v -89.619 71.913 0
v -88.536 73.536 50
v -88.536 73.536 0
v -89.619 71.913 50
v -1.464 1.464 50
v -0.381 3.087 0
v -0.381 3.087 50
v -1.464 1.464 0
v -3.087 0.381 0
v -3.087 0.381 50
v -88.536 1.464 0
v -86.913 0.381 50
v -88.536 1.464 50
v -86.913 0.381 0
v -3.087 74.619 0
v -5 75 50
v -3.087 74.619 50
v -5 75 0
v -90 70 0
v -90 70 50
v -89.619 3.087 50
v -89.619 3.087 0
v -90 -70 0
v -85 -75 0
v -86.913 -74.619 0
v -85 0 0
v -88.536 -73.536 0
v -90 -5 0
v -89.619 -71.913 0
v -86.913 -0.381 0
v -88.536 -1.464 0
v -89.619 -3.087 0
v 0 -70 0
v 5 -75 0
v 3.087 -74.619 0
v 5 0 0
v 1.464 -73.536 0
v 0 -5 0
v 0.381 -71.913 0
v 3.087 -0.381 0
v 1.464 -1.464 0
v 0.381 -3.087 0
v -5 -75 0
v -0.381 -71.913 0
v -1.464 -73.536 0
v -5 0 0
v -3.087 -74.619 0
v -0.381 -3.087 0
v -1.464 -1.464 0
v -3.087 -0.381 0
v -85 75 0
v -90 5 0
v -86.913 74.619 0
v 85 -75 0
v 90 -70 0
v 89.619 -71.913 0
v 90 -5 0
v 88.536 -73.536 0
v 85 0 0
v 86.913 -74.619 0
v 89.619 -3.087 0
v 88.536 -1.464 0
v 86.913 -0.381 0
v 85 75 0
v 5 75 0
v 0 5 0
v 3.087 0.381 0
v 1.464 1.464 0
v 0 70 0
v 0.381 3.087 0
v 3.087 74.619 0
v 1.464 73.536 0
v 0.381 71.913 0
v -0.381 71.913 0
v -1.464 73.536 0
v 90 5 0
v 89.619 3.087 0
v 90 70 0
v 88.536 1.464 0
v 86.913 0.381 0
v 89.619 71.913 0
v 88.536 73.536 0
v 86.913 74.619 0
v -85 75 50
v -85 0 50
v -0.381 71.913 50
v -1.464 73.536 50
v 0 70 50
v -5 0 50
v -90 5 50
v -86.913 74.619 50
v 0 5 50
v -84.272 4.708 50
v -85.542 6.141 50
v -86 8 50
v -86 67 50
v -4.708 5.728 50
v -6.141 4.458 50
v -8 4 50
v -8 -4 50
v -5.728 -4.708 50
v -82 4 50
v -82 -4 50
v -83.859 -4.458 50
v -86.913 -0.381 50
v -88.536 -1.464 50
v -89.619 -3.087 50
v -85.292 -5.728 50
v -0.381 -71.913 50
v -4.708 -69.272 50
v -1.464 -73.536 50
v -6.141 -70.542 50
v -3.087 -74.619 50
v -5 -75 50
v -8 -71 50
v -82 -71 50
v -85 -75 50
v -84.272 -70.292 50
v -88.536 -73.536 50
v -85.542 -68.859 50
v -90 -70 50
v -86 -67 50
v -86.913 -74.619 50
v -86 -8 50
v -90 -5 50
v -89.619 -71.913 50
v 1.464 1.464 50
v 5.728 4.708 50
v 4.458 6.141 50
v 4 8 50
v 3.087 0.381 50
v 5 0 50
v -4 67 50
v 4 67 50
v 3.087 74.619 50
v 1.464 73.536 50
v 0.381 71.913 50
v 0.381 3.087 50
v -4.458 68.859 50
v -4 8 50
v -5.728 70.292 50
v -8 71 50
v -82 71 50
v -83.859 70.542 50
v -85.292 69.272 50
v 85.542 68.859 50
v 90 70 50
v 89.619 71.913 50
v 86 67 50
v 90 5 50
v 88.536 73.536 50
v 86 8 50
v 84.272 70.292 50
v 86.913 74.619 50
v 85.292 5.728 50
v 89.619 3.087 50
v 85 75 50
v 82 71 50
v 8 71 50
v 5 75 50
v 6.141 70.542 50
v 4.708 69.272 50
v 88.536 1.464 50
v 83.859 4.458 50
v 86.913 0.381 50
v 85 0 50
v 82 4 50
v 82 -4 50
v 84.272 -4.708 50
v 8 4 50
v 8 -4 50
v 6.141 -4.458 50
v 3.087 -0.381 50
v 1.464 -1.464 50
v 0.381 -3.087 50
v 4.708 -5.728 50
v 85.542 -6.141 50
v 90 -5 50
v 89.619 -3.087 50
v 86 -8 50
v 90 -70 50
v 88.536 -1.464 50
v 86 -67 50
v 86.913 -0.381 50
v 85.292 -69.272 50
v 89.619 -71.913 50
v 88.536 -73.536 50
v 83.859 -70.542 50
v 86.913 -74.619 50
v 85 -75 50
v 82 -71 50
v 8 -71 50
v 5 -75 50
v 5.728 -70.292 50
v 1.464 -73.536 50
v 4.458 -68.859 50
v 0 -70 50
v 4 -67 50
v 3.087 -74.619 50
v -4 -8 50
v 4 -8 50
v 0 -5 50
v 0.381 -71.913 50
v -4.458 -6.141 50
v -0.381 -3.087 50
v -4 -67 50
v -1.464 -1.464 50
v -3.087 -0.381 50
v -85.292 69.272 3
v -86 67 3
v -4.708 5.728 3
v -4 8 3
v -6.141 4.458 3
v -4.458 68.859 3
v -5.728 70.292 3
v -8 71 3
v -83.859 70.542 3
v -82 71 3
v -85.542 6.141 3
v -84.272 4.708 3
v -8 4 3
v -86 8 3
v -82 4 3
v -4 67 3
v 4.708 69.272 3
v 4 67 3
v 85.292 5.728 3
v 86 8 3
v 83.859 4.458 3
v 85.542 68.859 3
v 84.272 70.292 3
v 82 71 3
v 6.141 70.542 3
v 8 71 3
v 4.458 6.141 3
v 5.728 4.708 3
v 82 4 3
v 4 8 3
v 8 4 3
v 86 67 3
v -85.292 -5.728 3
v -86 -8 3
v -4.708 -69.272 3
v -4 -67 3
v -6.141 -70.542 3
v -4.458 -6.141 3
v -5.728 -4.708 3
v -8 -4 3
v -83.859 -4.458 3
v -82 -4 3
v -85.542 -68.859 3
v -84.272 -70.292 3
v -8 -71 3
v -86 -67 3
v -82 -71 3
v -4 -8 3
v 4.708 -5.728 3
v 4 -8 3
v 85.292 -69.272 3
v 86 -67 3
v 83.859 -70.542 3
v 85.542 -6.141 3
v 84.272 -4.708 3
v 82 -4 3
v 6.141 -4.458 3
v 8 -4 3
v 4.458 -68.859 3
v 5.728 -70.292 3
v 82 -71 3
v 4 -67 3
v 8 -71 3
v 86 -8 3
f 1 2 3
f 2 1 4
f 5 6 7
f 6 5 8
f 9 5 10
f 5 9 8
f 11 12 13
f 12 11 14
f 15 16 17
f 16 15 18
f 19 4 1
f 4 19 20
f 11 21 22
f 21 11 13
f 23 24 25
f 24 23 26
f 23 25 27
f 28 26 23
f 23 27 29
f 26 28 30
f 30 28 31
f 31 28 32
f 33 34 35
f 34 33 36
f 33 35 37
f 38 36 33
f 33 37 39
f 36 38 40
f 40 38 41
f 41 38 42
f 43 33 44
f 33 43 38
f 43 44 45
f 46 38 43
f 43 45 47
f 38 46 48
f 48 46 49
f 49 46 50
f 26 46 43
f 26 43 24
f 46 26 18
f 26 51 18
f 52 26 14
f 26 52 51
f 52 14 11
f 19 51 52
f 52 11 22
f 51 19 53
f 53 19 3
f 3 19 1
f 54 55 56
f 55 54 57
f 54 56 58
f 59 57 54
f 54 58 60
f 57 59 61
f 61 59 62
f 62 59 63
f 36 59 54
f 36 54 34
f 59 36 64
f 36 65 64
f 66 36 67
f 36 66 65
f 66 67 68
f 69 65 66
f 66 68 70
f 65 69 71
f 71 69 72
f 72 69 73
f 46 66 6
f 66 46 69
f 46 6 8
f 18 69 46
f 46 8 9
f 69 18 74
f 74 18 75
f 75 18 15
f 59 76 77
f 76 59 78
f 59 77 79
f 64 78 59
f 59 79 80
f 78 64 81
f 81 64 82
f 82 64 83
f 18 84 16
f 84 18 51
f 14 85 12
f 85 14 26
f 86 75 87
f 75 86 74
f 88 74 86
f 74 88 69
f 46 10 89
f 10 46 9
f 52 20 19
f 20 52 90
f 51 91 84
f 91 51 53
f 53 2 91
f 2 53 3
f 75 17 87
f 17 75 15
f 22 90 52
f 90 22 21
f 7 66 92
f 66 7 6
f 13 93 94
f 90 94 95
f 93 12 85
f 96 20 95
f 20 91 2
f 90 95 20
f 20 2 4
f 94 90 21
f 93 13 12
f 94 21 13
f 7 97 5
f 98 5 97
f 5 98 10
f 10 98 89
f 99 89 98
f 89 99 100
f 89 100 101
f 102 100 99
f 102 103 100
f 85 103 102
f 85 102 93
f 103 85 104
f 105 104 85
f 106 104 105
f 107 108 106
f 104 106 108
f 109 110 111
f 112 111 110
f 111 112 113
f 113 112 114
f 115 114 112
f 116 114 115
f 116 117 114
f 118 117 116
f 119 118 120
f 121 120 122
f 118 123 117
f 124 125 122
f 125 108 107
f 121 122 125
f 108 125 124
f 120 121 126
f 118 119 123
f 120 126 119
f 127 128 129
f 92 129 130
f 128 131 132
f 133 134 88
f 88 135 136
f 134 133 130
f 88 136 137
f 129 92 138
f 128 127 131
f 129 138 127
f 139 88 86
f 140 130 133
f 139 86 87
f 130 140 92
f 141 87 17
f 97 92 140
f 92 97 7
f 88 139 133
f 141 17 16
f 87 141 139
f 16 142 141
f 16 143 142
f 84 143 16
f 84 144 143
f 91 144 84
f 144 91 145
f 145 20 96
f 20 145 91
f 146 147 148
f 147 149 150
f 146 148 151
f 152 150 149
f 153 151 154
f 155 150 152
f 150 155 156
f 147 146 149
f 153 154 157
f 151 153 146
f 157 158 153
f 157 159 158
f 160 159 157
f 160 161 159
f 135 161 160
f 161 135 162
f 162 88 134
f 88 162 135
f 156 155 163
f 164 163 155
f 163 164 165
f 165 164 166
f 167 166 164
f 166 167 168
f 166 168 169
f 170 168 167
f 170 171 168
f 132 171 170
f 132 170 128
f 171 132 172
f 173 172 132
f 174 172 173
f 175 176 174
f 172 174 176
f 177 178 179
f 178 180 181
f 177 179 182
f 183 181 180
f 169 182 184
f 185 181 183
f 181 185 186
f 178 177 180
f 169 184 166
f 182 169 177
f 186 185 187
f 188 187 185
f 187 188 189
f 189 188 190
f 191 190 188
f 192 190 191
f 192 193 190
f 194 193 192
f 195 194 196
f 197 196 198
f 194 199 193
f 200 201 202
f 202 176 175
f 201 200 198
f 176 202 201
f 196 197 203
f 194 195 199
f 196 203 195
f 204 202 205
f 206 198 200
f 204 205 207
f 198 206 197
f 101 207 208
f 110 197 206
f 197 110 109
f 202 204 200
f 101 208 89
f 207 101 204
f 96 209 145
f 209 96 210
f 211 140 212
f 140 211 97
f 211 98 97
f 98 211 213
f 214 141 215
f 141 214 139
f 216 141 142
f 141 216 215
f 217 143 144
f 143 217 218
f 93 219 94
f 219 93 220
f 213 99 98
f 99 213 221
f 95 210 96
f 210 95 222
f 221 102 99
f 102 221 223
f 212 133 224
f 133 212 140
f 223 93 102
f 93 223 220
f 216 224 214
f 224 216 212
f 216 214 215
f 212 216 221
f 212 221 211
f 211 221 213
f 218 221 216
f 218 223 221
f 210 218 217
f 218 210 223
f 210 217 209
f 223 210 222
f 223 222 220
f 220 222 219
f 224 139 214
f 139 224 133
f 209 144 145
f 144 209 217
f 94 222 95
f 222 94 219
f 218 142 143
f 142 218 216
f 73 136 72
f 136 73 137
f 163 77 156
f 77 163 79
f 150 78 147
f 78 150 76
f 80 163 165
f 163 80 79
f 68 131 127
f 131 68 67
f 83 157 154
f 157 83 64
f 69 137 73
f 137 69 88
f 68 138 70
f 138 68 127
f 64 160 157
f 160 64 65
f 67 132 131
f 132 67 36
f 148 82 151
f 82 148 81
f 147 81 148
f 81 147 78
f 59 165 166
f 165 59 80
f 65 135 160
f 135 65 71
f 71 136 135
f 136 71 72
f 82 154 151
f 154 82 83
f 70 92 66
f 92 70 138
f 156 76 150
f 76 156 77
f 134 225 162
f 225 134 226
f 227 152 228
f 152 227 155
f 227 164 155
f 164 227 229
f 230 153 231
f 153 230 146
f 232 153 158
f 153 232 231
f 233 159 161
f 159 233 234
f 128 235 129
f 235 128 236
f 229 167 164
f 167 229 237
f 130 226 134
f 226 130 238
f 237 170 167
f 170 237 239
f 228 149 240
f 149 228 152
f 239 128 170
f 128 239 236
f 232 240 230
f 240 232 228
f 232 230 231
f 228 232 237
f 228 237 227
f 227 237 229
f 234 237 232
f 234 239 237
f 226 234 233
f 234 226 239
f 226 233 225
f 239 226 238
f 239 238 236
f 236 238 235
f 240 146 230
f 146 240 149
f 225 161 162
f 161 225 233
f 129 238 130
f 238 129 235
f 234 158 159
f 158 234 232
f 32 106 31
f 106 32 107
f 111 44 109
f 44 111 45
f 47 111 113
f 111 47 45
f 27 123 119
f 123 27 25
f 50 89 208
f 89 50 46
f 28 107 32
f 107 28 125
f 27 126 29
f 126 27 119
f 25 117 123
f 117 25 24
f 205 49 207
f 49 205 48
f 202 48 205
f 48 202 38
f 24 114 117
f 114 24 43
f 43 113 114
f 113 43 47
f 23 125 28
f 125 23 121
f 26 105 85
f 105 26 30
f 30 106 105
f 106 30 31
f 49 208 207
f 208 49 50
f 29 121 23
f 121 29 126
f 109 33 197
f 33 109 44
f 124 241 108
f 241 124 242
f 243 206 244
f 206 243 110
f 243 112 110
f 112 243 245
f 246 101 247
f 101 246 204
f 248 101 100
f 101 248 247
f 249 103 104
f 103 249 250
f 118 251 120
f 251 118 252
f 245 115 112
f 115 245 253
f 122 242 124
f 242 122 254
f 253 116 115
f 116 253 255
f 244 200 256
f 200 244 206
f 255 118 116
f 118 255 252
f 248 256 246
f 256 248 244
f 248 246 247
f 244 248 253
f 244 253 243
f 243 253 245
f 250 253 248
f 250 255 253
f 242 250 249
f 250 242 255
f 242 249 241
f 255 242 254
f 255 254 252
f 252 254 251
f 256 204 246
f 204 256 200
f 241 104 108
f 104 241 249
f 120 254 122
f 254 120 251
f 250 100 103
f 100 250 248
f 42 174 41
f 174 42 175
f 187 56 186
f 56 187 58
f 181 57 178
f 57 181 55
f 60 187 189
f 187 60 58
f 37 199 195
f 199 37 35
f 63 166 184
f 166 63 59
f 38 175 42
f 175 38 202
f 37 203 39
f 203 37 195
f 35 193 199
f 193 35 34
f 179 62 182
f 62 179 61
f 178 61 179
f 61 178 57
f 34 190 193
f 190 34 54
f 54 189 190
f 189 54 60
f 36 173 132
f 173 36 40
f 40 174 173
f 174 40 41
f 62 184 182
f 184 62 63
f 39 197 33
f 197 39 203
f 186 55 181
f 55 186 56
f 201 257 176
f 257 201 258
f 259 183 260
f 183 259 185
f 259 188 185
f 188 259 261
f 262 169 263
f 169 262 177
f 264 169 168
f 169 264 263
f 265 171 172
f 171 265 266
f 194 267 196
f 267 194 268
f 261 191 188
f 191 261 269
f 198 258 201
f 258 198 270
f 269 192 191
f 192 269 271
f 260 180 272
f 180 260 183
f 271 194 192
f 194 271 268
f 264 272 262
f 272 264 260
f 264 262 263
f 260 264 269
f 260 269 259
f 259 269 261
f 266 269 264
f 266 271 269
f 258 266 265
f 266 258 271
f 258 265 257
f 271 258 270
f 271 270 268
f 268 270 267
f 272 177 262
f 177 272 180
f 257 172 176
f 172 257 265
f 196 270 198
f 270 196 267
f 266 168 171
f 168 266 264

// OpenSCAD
// Dell PowerEdge R740 Floor Standoffs
//
// Print 4 in PETG or ABS.  Keeps a 2U server off the floor
// for dust clearance and bottom intake airflow.
//
// Adjust dimensions at the top, then render (F6) and export STL.
// The `layout()` module arranges all 4 pieces for a single print.

// ── User parameters ───────────────────────────────────────
STANDOFF_H  = 50;   // total height (mm) — clearance off floor
WALL        = 3;    // shell thickness (mm)
FILLET      = 5;    // corner fillet radius (mm)

// ── Chassis measurements (Dell R740 bottom panel) ─────────
// The R740's rubber feet are ~15x15mm squares positioned at
// the four corners of the flat bottom plate, inset slightly
// from the outer edge.
FOOT_W      = 15;   // rubber foot width (mm)
FOOT_D      = 15;   // rubber foot depth (mm)
FOOT_POCKET = 2;    // recess depth for the foot to sit in (mm)

// Overall block size — wide enough for stability
BLOCK_W     = 80;   // width (mm, left-right)
BLOCK_D     = 65;   // depth (mm, front-back)

// ── Calculated internals ──────────────────────────────────
POCKET_W = BLOCK_W - WALL * 2 - 4;  // pocket width (unused)
POCKET_D = BLOCK_D - WALL * 2 - 4;  // pocket depth (unused)

// ── Modules ───────────────────────────────────────────────
module standoff() {
  difference() {
    // Outer shell — rounded block
    linear_extrude(height = STANDOFF_H)
      offset(r = FILLET)
        square([BLOCK_W, BLOCK_D], center = true);

    // Hollow cavity — saves filament, still strong enough
    // with 3mm walls + 50mm of PETG above the foot pocket.
    translate([0, 0, WALL])
      linear_extrude(height = STANDOFF_H - WALL + 0.1)
        offset(r = FILLET - 1)
          square([BLOCK_W - WALL * 2, BLOCK_D - WALL * 2],
                 center = true);

    // Foot pocket — recess on top surface for rubber foot
    translate([0, 0, STANDOFF_H - FOOT_POCKET])
      linear_extrude(height = FOOT_POCKET + 0.1)
        square([FOOT_W + 2, FOOT_D + 2], center = true);
  }
}

// ── Layout helper ─────────────────────────────────────────
// Places 4 standoffs on a single print bed.
module layout(gap = 10) {
  x = BLOCK_W + gap;
  y = BLOCK_D + gap;

  translate([-x / 2,  y / 2, 0]) standoff();    // front-left
  translate([ x / 2,  y / 2, 0]) standoff();    // front-right
  translate([-x / 2, -y / 2, 0]) standoff();    // rear-left
  translate([ x / 2, -y / 2, 0]) standoff();    // rear-right
}

// ── Render ────────────────────────────────────────────────
// Comment/uncomment to switch between print layout and single preview.
layout(gap = 10);
// standoff();
